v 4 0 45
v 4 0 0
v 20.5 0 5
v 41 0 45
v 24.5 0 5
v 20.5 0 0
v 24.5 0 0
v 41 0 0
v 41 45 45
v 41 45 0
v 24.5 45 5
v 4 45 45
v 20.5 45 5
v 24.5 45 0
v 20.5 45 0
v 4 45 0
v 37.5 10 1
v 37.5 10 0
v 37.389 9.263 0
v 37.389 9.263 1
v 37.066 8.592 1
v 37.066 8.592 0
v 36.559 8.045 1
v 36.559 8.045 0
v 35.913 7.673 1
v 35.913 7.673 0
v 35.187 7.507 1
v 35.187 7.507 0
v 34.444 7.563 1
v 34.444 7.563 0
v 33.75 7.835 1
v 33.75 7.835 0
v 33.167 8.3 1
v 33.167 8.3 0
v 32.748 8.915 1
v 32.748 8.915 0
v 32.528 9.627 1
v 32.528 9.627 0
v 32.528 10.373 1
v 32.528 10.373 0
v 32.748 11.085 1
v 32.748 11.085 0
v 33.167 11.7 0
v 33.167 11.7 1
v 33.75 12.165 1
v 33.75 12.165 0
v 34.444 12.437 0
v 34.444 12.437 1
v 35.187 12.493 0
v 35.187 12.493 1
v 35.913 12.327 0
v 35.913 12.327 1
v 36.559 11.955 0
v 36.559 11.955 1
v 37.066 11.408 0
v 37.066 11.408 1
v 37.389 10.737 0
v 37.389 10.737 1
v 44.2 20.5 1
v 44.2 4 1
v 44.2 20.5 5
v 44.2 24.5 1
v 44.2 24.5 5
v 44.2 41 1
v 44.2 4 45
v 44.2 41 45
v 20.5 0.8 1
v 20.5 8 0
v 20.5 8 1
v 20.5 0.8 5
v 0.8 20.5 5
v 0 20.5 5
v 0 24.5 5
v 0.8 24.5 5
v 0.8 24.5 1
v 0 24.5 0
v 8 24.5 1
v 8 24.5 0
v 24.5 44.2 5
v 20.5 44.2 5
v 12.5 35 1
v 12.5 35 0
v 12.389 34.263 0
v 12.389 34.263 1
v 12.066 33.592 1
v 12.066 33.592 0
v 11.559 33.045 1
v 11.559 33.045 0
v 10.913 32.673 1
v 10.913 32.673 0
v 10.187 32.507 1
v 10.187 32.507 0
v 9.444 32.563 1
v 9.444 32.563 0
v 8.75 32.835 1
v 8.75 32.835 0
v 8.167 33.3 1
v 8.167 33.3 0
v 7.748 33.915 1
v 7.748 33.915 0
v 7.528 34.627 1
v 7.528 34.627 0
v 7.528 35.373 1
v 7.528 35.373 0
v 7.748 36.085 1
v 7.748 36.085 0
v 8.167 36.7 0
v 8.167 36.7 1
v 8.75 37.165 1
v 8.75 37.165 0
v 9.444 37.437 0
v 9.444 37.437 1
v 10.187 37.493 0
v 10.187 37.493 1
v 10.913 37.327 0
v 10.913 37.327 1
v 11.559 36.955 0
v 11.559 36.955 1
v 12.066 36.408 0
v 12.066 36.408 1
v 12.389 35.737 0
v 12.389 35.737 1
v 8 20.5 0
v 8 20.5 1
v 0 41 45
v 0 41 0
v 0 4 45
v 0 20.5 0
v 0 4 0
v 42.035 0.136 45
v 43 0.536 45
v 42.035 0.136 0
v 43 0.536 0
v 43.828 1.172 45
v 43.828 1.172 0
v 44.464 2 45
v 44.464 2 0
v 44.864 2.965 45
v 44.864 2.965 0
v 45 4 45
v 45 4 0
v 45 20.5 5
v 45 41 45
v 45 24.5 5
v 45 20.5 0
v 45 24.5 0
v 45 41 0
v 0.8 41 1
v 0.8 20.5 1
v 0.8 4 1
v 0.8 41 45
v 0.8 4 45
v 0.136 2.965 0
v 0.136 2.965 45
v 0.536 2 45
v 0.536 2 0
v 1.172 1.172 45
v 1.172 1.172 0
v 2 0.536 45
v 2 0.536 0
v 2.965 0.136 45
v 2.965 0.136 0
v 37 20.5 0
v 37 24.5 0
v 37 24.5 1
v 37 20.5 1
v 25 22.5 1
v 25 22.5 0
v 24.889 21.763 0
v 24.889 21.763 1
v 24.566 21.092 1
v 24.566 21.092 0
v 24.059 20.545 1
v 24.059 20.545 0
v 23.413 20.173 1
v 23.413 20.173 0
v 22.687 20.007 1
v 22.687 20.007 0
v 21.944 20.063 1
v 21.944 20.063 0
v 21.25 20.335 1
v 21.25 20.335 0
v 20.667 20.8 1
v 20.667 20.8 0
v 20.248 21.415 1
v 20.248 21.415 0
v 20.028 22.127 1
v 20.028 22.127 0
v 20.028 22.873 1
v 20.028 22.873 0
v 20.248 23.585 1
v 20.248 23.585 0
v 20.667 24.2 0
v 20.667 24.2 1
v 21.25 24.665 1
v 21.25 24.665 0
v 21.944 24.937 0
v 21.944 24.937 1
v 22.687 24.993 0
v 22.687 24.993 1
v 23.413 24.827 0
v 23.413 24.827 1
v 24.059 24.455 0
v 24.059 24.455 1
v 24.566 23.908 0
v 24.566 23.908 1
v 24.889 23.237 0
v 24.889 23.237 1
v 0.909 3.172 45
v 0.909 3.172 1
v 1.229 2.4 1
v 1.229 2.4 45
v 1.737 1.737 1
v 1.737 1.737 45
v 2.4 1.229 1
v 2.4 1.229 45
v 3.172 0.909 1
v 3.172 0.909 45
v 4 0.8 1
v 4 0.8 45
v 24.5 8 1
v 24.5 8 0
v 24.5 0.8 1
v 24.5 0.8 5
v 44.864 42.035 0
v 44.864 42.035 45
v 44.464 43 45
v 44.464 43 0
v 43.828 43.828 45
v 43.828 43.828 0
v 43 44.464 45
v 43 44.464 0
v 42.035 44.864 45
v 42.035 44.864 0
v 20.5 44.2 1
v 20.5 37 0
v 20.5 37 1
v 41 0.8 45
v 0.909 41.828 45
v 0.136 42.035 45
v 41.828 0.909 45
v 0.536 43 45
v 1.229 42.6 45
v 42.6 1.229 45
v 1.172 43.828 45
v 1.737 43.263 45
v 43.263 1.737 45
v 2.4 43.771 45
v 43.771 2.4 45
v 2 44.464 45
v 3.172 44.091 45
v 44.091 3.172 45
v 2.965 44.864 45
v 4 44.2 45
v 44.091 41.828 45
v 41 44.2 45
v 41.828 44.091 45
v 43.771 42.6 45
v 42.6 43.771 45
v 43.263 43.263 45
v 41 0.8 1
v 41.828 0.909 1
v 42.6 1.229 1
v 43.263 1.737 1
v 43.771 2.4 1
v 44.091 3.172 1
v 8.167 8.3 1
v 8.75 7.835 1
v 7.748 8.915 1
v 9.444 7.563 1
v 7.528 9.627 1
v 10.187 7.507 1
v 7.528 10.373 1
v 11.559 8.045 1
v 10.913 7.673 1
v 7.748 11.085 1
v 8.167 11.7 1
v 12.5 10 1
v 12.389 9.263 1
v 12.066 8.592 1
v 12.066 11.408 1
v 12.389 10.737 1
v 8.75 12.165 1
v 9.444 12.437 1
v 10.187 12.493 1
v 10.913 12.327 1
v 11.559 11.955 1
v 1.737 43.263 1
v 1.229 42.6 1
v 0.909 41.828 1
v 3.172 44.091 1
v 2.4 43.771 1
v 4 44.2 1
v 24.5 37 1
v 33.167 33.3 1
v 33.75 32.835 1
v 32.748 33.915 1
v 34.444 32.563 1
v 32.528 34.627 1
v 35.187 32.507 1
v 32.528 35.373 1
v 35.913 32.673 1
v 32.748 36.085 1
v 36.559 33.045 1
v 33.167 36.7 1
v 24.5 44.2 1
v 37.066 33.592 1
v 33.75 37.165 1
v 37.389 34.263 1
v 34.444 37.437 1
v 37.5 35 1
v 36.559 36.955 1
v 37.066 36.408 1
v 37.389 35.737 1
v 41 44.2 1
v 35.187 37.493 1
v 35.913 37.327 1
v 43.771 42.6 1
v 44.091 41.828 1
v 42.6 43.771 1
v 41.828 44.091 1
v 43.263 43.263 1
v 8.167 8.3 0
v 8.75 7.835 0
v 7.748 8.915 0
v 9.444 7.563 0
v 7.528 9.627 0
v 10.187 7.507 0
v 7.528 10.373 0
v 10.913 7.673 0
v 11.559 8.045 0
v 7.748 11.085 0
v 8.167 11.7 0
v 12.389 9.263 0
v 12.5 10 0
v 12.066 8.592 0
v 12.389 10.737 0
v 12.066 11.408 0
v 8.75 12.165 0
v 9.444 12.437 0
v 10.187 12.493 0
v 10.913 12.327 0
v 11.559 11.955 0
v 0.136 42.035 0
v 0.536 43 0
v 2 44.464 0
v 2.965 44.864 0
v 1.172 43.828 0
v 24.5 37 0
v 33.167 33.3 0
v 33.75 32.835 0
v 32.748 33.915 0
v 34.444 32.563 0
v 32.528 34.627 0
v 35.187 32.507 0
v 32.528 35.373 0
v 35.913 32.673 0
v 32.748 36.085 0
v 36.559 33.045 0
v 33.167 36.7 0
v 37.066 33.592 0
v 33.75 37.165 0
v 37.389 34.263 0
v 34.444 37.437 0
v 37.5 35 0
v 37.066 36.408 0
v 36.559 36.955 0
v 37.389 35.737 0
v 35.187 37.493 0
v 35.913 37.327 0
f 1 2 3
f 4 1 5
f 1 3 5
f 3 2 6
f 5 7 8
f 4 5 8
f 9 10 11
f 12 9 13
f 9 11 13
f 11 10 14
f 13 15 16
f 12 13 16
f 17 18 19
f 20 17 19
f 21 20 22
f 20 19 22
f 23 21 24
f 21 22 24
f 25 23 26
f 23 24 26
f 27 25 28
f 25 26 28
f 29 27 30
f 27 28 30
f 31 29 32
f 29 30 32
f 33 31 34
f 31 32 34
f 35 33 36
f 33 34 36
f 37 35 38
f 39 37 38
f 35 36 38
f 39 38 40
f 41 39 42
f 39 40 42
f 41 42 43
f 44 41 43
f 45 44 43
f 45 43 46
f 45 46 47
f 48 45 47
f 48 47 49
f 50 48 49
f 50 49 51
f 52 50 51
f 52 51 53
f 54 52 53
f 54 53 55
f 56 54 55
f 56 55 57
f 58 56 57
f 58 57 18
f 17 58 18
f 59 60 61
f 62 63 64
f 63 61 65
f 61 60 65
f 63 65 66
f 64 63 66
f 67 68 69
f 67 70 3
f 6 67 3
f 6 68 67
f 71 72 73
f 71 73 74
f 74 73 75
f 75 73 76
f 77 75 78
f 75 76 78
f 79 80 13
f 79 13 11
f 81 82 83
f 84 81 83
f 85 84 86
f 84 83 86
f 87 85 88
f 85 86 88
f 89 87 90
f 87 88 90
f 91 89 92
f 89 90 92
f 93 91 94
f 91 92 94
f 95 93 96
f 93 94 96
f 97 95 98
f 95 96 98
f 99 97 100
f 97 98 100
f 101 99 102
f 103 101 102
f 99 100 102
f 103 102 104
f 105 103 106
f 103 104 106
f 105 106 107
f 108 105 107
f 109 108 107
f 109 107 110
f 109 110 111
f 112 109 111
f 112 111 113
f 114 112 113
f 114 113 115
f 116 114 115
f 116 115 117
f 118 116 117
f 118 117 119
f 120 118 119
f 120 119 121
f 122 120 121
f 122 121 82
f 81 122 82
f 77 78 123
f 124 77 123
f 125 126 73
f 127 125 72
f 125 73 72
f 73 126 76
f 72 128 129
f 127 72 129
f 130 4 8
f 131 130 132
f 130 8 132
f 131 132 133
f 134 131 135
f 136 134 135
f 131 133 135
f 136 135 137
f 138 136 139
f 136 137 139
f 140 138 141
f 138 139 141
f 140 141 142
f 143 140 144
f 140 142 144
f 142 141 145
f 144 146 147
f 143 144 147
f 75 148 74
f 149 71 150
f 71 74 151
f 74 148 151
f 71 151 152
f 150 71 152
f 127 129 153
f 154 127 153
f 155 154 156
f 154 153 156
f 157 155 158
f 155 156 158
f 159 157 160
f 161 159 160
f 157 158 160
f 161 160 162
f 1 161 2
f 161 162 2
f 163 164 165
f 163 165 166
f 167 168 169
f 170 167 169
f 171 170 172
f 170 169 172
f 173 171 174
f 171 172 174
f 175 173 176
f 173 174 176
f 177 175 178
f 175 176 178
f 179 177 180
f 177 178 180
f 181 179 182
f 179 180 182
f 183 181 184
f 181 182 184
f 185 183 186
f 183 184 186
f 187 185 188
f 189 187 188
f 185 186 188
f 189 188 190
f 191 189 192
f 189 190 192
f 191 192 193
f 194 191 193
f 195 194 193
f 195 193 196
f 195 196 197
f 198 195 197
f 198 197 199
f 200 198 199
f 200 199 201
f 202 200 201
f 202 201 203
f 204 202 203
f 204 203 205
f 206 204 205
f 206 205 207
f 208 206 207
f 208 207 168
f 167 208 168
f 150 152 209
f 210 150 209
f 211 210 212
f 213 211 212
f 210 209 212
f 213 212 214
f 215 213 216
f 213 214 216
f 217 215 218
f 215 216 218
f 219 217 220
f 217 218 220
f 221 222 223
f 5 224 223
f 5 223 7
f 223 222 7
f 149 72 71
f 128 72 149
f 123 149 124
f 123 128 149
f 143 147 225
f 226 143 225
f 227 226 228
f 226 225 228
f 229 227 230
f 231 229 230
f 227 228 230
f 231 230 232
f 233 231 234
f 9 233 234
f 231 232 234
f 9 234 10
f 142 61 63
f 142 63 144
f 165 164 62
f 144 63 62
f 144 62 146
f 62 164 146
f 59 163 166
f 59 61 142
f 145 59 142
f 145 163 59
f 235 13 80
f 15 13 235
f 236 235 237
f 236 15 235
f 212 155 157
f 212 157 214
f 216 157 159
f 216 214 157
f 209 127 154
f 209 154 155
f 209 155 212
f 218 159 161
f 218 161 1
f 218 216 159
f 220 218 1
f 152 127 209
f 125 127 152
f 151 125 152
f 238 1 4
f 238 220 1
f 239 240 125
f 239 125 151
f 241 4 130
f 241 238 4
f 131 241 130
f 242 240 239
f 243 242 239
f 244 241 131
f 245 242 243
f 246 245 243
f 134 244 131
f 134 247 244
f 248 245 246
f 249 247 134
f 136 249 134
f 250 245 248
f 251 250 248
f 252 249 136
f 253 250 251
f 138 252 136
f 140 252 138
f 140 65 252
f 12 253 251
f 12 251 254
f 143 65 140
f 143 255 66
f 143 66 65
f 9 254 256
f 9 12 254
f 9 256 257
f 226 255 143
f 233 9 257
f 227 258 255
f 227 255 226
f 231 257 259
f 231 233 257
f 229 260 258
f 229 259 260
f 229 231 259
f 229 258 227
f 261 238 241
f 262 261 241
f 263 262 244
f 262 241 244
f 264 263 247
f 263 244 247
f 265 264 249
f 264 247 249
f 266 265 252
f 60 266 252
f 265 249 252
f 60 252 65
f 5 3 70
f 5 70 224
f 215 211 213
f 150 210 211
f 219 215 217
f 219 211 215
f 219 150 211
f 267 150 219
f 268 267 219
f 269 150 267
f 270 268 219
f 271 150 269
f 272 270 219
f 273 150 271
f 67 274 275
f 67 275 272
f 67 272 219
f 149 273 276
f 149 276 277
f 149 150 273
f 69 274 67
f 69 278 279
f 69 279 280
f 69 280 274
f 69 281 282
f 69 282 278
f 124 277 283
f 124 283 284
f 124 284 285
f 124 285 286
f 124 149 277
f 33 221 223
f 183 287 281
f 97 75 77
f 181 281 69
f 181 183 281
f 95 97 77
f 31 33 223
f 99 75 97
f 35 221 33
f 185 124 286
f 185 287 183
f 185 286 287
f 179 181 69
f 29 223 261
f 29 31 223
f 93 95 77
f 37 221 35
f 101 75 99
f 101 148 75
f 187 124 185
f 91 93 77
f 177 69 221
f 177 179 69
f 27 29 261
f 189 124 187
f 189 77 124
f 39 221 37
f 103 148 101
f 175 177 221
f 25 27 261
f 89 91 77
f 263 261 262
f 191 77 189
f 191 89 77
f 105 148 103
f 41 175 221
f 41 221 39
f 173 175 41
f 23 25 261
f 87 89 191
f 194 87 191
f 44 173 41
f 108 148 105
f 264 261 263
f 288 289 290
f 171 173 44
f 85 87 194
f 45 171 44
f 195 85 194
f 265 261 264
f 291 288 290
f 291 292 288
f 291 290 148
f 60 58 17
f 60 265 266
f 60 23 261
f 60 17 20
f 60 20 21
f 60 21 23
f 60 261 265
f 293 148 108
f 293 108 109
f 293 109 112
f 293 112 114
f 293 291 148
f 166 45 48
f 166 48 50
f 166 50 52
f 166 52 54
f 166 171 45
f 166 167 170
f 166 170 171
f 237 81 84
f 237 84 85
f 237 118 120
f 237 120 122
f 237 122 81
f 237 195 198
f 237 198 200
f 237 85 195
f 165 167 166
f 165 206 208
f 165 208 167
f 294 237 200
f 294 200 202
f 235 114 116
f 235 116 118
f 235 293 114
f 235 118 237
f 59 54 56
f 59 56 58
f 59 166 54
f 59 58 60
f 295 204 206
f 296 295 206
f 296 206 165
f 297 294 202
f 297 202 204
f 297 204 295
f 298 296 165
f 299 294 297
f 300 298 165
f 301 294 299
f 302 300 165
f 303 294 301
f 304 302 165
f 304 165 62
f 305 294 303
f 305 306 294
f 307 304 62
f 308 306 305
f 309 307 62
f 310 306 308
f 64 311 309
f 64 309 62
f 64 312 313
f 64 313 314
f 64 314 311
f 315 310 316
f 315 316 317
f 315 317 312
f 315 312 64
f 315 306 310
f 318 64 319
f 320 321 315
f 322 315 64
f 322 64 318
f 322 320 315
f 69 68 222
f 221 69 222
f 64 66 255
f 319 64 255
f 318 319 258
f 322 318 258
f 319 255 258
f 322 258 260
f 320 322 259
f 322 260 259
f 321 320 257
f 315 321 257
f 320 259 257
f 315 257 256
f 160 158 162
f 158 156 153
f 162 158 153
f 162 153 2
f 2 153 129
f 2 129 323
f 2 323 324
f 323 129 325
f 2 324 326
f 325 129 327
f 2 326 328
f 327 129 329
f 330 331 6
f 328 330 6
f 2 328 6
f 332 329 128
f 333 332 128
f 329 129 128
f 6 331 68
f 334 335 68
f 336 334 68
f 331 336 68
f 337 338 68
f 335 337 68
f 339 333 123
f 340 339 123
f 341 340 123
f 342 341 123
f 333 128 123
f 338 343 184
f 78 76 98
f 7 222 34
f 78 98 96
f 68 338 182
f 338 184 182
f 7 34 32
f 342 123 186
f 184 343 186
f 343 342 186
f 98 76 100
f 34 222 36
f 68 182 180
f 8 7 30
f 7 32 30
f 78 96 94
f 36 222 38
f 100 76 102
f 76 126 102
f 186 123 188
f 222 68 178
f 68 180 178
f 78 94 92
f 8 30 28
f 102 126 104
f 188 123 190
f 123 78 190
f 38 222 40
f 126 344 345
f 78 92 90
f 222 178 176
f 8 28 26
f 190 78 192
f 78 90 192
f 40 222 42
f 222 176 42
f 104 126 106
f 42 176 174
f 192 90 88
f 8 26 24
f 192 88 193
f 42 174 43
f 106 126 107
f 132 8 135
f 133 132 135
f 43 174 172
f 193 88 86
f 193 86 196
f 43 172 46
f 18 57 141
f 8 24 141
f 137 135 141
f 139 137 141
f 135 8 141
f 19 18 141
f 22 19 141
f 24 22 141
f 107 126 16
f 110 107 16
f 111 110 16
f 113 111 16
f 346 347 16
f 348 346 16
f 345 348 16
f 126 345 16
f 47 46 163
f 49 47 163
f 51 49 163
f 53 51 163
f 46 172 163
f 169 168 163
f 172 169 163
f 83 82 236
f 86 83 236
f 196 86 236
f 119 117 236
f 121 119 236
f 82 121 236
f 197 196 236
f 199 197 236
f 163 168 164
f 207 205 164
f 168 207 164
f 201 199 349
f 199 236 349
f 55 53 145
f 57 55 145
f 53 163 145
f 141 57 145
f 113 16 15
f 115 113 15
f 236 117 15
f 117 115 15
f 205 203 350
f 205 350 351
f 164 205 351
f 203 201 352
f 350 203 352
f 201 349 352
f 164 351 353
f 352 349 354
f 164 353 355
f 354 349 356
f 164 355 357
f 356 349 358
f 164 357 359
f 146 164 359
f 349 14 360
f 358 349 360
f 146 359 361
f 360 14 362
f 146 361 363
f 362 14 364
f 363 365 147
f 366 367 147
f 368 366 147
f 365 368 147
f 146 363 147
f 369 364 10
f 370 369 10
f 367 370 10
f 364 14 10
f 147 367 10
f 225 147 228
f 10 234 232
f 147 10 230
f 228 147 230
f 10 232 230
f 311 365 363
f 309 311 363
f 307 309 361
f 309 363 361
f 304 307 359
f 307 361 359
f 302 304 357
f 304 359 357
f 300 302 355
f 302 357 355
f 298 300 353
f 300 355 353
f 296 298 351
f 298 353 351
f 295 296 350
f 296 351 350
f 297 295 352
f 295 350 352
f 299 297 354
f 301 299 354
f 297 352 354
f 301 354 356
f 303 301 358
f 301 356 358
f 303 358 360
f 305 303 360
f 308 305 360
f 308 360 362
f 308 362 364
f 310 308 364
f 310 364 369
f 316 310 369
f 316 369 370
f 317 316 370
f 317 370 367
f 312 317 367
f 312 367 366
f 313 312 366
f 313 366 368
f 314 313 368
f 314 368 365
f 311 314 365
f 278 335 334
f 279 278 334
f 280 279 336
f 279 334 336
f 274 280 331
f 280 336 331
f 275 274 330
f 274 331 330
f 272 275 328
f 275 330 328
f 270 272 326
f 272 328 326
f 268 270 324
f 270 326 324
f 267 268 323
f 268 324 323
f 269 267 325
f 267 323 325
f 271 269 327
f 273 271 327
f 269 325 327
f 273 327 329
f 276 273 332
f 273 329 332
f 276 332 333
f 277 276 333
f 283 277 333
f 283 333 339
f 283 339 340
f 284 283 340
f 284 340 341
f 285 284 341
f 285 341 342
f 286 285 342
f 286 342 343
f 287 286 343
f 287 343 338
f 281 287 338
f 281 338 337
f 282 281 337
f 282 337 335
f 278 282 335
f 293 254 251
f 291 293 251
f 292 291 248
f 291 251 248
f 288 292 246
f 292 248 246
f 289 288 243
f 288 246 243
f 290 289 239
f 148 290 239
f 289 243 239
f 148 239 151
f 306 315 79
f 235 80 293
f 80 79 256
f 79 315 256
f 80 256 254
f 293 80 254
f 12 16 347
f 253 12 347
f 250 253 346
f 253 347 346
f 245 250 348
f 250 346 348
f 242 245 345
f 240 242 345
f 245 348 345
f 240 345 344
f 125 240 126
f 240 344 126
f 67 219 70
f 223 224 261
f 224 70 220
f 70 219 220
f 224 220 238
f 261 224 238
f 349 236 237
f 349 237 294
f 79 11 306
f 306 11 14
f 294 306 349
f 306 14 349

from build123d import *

# Parameters (mm, degrees)
PAD_DEPTH       = 45
POCKET_DEPTH    = 44
SKETCH002_R     = 2.5
SKETCH002_W     = 4
SKETCH002_H     = 8
SKETCH002_W_2   = 8
SKETCH002_H_2   = 4
POCKET001_DEPTH = 5


with BuildPart() as part:
    # Sketch → Pad (new body)
    with BuildSketch(Plane.XY):
        with BuildLine():
            Line((4, 0), (41, 0))
            ThreePointArc((41, 0), (43.828427, 1.171573), (45, 4))
            Line((45, 4), (45, 41))
            ThreePointArc((45, 41), (43.828427, 43.828427), (41, 45))
            Line((41, 45), (4, 45))
            ThreePointArc((4, 45), (1.171573, 43.828427), (0, 41))
            Line((0, 41), (0, 4))
            ThreePointArc((0, 4), (1.171573, 1.171573), (4, 0))
        make_face()
    extrude(amount=PAD_DEPTH)

    # Sketch001 (on Face10 of Pad) → Pocket (cut)
    with BuildSketch(Plane.XY.offset(45)):
        with BuildLine():
            Line((4, 0.8), (41, 0.8))
            ThreePointArc((41, 0.8), (43.262742, 1.737258), (44.2, 4))
            Line((44.2, 4), (44.2, 41))
            ThreePointArc((44.2, 41), (43.262742, 43.262742), (41, 44.2))
            Line((41, 44.2), (4, 44.2))
            ThreePointArc((4, 44.2), (1.737258, 43.262742), (0.8, 41))
            Line((0.8, 41), (0.8, 4))
            ThreePointArc((0.8, 4), (1.737258, 1.737258), (4, 0.8))
        make_face()
    extrude(amount=-POCKET_DEPTH, mode=Mode.SUBTRACT)

    # Sketch002 (on Face4 of Pocket) → Pocket001 (cut)
    with BuildSketch(Plane(origin=(0, 0, 0), x_dir=(1, 0, 0), z_dir=(0, 0, -1))):
        with Locations((10, -10)):
            Circle(SKETCH002_R)
        with Locations((22.5, -22.5)):
            Circle(SKETCH002_R)
        with Locations((35, -10)):
            Circle(SKETCH002_R)
        with Locations((35, -35)):
            Circle(SKETCH002_R)
        with Locations((10, -35)):
            Circle(SKETCH002_R)
        with Locations((22.5, -4)):
            Rectangle(SKETCH002_W, SKETCH002_H)
        with Locations((4, -22.5)):
            Rectangle(SKETCH002_W_2, SKETCH002_H_2)
        with Locations((41, -22.5)):
            Rectangle(SKETCH002_W_2, SKETCH002_H_2)
        with Locations((22.5, -41)):
            Rectangle(SKETCH002_W, SKETCH002_H)
    extrude(amount=-POCKET001_DEPTH, mode=Mode.SUBTRACT)


solid = part.part
